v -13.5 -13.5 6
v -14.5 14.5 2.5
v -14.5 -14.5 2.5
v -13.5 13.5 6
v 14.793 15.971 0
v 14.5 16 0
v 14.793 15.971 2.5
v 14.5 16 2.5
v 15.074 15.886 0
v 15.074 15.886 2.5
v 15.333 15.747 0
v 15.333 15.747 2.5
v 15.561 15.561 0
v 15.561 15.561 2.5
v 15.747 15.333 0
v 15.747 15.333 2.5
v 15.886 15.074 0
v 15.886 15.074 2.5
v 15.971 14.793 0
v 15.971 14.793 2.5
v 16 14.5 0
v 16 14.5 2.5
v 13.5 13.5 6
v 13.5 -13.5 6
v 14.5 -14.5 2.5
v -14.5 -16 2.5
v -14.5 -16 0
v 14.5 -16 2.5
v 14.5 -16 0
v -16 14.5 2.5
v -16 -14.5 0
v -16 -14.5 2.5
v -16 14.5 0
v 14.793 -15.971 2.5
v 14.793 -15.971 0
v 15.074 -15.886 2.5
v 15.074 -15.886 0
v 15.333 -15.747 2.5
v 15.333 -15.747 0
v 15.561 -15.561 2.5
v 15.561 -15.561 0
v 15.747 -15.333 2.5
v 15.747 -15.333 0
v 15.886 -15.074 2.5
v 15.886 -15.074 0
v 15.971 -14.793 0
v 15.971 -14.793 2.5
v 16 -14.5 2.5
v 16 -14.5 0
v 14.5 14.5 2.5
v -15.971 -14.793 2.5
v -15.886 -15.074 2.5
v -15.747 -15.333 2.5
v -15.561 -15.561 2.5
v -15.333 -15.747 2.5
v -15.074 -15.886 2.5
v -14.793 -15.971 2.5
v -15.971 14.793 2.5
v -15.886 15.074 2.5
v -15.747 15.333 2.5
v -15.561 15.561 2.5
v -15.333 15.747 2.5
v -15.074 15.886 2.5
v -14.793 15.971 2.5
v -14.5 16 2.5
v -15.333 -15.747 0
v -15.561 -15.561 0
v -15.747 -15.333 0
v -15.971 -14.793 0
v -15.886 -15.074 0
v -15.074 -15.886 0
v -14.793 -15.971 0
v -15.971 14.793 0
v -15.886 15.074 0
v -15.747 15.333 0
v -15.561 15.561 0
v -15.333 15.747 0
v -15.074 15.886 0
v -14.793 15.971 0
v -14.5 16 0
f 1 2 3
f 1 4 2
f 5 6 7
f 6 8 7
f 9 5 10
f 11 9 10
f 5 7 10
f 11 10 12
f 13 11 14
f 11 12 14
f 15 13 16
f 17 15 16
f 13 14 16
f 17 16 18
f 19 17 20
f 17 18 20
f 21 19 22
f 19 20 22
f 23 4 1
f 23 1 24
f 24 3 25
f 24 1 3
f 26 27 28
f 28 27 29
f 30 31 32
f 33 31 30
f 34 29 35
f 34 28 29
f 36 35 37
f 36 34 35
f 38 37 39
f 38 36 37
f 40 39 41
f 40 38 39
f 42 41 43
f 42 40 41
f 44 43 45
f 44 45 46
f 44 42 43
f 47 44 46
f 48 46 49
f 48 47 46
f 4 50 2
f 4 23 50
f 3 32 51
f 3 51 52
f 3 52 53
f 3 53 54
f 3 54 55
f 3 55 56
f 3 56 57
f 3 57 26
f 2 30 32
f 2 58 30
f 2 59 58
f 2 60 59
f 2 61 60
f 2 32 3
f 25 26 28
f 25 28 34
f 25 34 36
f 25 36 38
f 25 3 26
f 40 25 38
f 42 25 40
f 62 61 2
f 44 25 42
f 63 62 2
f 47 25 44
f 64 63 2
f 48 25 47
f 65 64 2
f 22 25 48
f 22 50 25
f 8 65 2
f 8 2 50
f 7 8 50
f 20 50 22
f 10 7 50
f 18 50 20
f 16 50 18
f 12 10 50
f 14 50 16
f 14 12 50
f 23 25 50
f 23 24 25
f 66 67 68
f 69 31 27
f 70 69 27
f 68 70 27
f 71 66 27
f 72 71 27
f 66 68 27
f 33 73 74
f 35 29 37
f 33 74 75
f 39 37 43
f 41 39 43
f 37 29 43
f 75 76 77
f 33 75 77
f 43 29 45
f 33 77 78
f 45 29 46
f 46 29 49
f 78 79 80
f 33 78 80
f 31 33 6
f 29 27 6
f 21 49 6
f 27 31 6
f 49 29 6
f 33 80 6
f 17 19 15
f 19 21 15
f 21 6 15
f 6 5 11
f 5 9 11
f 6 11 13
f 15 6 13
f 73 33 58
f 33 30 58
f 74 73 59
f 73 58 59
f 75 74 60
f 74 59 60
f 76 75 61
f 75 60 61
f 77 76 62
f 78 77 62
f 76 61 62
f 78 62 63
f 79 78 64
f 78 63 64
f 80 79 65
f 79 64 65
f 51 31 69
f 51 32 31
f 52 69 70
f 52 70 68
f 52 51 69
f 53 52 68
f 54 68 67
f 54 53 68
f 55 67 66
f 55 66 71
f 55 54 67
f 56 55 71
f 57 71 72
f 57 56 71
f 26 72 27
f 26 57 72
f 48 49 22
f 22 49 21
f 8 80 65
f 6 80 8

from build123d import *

# Parameters (mm, degrees)
F0_W     = 32
F0_H     = 32
F1_DEPTH = 2.5
F2_W     = 29
F2_H     = 29
F4_W     = 27
F4_H     = 27
F6_R     = 1.5


with BuildPart() as f1:
    # F0 (on Top) → F1 (new body)
    with BuildSketch(Plane.XY):
        Rectangle(F0_W, F0_H)
    extrude(amount=F1_DEPTH)

    # F2 (on face) → F5 section 0
    with BuildSketch(Plane.XY.offset(2.5)):
        Rectangle(F2_W, F2_H)
    # F4 (on offset) → F5 section 1
    with BuildSketch(Plane.XY.offset(6)):
        Rectangle(F4_W, F4_H)
    loft()

    # F6
    f6_edges = [f1.edges().sort_by_distance(p)[0] for p in [
        (16, 16, 1.25),
        (16, -16, 1.25),
        (-16, 16, 1.25),
        (-16, -16, 1.25),
    ]]
    fillet(f6_edges, radius=F6_R)


solid = f1.part
